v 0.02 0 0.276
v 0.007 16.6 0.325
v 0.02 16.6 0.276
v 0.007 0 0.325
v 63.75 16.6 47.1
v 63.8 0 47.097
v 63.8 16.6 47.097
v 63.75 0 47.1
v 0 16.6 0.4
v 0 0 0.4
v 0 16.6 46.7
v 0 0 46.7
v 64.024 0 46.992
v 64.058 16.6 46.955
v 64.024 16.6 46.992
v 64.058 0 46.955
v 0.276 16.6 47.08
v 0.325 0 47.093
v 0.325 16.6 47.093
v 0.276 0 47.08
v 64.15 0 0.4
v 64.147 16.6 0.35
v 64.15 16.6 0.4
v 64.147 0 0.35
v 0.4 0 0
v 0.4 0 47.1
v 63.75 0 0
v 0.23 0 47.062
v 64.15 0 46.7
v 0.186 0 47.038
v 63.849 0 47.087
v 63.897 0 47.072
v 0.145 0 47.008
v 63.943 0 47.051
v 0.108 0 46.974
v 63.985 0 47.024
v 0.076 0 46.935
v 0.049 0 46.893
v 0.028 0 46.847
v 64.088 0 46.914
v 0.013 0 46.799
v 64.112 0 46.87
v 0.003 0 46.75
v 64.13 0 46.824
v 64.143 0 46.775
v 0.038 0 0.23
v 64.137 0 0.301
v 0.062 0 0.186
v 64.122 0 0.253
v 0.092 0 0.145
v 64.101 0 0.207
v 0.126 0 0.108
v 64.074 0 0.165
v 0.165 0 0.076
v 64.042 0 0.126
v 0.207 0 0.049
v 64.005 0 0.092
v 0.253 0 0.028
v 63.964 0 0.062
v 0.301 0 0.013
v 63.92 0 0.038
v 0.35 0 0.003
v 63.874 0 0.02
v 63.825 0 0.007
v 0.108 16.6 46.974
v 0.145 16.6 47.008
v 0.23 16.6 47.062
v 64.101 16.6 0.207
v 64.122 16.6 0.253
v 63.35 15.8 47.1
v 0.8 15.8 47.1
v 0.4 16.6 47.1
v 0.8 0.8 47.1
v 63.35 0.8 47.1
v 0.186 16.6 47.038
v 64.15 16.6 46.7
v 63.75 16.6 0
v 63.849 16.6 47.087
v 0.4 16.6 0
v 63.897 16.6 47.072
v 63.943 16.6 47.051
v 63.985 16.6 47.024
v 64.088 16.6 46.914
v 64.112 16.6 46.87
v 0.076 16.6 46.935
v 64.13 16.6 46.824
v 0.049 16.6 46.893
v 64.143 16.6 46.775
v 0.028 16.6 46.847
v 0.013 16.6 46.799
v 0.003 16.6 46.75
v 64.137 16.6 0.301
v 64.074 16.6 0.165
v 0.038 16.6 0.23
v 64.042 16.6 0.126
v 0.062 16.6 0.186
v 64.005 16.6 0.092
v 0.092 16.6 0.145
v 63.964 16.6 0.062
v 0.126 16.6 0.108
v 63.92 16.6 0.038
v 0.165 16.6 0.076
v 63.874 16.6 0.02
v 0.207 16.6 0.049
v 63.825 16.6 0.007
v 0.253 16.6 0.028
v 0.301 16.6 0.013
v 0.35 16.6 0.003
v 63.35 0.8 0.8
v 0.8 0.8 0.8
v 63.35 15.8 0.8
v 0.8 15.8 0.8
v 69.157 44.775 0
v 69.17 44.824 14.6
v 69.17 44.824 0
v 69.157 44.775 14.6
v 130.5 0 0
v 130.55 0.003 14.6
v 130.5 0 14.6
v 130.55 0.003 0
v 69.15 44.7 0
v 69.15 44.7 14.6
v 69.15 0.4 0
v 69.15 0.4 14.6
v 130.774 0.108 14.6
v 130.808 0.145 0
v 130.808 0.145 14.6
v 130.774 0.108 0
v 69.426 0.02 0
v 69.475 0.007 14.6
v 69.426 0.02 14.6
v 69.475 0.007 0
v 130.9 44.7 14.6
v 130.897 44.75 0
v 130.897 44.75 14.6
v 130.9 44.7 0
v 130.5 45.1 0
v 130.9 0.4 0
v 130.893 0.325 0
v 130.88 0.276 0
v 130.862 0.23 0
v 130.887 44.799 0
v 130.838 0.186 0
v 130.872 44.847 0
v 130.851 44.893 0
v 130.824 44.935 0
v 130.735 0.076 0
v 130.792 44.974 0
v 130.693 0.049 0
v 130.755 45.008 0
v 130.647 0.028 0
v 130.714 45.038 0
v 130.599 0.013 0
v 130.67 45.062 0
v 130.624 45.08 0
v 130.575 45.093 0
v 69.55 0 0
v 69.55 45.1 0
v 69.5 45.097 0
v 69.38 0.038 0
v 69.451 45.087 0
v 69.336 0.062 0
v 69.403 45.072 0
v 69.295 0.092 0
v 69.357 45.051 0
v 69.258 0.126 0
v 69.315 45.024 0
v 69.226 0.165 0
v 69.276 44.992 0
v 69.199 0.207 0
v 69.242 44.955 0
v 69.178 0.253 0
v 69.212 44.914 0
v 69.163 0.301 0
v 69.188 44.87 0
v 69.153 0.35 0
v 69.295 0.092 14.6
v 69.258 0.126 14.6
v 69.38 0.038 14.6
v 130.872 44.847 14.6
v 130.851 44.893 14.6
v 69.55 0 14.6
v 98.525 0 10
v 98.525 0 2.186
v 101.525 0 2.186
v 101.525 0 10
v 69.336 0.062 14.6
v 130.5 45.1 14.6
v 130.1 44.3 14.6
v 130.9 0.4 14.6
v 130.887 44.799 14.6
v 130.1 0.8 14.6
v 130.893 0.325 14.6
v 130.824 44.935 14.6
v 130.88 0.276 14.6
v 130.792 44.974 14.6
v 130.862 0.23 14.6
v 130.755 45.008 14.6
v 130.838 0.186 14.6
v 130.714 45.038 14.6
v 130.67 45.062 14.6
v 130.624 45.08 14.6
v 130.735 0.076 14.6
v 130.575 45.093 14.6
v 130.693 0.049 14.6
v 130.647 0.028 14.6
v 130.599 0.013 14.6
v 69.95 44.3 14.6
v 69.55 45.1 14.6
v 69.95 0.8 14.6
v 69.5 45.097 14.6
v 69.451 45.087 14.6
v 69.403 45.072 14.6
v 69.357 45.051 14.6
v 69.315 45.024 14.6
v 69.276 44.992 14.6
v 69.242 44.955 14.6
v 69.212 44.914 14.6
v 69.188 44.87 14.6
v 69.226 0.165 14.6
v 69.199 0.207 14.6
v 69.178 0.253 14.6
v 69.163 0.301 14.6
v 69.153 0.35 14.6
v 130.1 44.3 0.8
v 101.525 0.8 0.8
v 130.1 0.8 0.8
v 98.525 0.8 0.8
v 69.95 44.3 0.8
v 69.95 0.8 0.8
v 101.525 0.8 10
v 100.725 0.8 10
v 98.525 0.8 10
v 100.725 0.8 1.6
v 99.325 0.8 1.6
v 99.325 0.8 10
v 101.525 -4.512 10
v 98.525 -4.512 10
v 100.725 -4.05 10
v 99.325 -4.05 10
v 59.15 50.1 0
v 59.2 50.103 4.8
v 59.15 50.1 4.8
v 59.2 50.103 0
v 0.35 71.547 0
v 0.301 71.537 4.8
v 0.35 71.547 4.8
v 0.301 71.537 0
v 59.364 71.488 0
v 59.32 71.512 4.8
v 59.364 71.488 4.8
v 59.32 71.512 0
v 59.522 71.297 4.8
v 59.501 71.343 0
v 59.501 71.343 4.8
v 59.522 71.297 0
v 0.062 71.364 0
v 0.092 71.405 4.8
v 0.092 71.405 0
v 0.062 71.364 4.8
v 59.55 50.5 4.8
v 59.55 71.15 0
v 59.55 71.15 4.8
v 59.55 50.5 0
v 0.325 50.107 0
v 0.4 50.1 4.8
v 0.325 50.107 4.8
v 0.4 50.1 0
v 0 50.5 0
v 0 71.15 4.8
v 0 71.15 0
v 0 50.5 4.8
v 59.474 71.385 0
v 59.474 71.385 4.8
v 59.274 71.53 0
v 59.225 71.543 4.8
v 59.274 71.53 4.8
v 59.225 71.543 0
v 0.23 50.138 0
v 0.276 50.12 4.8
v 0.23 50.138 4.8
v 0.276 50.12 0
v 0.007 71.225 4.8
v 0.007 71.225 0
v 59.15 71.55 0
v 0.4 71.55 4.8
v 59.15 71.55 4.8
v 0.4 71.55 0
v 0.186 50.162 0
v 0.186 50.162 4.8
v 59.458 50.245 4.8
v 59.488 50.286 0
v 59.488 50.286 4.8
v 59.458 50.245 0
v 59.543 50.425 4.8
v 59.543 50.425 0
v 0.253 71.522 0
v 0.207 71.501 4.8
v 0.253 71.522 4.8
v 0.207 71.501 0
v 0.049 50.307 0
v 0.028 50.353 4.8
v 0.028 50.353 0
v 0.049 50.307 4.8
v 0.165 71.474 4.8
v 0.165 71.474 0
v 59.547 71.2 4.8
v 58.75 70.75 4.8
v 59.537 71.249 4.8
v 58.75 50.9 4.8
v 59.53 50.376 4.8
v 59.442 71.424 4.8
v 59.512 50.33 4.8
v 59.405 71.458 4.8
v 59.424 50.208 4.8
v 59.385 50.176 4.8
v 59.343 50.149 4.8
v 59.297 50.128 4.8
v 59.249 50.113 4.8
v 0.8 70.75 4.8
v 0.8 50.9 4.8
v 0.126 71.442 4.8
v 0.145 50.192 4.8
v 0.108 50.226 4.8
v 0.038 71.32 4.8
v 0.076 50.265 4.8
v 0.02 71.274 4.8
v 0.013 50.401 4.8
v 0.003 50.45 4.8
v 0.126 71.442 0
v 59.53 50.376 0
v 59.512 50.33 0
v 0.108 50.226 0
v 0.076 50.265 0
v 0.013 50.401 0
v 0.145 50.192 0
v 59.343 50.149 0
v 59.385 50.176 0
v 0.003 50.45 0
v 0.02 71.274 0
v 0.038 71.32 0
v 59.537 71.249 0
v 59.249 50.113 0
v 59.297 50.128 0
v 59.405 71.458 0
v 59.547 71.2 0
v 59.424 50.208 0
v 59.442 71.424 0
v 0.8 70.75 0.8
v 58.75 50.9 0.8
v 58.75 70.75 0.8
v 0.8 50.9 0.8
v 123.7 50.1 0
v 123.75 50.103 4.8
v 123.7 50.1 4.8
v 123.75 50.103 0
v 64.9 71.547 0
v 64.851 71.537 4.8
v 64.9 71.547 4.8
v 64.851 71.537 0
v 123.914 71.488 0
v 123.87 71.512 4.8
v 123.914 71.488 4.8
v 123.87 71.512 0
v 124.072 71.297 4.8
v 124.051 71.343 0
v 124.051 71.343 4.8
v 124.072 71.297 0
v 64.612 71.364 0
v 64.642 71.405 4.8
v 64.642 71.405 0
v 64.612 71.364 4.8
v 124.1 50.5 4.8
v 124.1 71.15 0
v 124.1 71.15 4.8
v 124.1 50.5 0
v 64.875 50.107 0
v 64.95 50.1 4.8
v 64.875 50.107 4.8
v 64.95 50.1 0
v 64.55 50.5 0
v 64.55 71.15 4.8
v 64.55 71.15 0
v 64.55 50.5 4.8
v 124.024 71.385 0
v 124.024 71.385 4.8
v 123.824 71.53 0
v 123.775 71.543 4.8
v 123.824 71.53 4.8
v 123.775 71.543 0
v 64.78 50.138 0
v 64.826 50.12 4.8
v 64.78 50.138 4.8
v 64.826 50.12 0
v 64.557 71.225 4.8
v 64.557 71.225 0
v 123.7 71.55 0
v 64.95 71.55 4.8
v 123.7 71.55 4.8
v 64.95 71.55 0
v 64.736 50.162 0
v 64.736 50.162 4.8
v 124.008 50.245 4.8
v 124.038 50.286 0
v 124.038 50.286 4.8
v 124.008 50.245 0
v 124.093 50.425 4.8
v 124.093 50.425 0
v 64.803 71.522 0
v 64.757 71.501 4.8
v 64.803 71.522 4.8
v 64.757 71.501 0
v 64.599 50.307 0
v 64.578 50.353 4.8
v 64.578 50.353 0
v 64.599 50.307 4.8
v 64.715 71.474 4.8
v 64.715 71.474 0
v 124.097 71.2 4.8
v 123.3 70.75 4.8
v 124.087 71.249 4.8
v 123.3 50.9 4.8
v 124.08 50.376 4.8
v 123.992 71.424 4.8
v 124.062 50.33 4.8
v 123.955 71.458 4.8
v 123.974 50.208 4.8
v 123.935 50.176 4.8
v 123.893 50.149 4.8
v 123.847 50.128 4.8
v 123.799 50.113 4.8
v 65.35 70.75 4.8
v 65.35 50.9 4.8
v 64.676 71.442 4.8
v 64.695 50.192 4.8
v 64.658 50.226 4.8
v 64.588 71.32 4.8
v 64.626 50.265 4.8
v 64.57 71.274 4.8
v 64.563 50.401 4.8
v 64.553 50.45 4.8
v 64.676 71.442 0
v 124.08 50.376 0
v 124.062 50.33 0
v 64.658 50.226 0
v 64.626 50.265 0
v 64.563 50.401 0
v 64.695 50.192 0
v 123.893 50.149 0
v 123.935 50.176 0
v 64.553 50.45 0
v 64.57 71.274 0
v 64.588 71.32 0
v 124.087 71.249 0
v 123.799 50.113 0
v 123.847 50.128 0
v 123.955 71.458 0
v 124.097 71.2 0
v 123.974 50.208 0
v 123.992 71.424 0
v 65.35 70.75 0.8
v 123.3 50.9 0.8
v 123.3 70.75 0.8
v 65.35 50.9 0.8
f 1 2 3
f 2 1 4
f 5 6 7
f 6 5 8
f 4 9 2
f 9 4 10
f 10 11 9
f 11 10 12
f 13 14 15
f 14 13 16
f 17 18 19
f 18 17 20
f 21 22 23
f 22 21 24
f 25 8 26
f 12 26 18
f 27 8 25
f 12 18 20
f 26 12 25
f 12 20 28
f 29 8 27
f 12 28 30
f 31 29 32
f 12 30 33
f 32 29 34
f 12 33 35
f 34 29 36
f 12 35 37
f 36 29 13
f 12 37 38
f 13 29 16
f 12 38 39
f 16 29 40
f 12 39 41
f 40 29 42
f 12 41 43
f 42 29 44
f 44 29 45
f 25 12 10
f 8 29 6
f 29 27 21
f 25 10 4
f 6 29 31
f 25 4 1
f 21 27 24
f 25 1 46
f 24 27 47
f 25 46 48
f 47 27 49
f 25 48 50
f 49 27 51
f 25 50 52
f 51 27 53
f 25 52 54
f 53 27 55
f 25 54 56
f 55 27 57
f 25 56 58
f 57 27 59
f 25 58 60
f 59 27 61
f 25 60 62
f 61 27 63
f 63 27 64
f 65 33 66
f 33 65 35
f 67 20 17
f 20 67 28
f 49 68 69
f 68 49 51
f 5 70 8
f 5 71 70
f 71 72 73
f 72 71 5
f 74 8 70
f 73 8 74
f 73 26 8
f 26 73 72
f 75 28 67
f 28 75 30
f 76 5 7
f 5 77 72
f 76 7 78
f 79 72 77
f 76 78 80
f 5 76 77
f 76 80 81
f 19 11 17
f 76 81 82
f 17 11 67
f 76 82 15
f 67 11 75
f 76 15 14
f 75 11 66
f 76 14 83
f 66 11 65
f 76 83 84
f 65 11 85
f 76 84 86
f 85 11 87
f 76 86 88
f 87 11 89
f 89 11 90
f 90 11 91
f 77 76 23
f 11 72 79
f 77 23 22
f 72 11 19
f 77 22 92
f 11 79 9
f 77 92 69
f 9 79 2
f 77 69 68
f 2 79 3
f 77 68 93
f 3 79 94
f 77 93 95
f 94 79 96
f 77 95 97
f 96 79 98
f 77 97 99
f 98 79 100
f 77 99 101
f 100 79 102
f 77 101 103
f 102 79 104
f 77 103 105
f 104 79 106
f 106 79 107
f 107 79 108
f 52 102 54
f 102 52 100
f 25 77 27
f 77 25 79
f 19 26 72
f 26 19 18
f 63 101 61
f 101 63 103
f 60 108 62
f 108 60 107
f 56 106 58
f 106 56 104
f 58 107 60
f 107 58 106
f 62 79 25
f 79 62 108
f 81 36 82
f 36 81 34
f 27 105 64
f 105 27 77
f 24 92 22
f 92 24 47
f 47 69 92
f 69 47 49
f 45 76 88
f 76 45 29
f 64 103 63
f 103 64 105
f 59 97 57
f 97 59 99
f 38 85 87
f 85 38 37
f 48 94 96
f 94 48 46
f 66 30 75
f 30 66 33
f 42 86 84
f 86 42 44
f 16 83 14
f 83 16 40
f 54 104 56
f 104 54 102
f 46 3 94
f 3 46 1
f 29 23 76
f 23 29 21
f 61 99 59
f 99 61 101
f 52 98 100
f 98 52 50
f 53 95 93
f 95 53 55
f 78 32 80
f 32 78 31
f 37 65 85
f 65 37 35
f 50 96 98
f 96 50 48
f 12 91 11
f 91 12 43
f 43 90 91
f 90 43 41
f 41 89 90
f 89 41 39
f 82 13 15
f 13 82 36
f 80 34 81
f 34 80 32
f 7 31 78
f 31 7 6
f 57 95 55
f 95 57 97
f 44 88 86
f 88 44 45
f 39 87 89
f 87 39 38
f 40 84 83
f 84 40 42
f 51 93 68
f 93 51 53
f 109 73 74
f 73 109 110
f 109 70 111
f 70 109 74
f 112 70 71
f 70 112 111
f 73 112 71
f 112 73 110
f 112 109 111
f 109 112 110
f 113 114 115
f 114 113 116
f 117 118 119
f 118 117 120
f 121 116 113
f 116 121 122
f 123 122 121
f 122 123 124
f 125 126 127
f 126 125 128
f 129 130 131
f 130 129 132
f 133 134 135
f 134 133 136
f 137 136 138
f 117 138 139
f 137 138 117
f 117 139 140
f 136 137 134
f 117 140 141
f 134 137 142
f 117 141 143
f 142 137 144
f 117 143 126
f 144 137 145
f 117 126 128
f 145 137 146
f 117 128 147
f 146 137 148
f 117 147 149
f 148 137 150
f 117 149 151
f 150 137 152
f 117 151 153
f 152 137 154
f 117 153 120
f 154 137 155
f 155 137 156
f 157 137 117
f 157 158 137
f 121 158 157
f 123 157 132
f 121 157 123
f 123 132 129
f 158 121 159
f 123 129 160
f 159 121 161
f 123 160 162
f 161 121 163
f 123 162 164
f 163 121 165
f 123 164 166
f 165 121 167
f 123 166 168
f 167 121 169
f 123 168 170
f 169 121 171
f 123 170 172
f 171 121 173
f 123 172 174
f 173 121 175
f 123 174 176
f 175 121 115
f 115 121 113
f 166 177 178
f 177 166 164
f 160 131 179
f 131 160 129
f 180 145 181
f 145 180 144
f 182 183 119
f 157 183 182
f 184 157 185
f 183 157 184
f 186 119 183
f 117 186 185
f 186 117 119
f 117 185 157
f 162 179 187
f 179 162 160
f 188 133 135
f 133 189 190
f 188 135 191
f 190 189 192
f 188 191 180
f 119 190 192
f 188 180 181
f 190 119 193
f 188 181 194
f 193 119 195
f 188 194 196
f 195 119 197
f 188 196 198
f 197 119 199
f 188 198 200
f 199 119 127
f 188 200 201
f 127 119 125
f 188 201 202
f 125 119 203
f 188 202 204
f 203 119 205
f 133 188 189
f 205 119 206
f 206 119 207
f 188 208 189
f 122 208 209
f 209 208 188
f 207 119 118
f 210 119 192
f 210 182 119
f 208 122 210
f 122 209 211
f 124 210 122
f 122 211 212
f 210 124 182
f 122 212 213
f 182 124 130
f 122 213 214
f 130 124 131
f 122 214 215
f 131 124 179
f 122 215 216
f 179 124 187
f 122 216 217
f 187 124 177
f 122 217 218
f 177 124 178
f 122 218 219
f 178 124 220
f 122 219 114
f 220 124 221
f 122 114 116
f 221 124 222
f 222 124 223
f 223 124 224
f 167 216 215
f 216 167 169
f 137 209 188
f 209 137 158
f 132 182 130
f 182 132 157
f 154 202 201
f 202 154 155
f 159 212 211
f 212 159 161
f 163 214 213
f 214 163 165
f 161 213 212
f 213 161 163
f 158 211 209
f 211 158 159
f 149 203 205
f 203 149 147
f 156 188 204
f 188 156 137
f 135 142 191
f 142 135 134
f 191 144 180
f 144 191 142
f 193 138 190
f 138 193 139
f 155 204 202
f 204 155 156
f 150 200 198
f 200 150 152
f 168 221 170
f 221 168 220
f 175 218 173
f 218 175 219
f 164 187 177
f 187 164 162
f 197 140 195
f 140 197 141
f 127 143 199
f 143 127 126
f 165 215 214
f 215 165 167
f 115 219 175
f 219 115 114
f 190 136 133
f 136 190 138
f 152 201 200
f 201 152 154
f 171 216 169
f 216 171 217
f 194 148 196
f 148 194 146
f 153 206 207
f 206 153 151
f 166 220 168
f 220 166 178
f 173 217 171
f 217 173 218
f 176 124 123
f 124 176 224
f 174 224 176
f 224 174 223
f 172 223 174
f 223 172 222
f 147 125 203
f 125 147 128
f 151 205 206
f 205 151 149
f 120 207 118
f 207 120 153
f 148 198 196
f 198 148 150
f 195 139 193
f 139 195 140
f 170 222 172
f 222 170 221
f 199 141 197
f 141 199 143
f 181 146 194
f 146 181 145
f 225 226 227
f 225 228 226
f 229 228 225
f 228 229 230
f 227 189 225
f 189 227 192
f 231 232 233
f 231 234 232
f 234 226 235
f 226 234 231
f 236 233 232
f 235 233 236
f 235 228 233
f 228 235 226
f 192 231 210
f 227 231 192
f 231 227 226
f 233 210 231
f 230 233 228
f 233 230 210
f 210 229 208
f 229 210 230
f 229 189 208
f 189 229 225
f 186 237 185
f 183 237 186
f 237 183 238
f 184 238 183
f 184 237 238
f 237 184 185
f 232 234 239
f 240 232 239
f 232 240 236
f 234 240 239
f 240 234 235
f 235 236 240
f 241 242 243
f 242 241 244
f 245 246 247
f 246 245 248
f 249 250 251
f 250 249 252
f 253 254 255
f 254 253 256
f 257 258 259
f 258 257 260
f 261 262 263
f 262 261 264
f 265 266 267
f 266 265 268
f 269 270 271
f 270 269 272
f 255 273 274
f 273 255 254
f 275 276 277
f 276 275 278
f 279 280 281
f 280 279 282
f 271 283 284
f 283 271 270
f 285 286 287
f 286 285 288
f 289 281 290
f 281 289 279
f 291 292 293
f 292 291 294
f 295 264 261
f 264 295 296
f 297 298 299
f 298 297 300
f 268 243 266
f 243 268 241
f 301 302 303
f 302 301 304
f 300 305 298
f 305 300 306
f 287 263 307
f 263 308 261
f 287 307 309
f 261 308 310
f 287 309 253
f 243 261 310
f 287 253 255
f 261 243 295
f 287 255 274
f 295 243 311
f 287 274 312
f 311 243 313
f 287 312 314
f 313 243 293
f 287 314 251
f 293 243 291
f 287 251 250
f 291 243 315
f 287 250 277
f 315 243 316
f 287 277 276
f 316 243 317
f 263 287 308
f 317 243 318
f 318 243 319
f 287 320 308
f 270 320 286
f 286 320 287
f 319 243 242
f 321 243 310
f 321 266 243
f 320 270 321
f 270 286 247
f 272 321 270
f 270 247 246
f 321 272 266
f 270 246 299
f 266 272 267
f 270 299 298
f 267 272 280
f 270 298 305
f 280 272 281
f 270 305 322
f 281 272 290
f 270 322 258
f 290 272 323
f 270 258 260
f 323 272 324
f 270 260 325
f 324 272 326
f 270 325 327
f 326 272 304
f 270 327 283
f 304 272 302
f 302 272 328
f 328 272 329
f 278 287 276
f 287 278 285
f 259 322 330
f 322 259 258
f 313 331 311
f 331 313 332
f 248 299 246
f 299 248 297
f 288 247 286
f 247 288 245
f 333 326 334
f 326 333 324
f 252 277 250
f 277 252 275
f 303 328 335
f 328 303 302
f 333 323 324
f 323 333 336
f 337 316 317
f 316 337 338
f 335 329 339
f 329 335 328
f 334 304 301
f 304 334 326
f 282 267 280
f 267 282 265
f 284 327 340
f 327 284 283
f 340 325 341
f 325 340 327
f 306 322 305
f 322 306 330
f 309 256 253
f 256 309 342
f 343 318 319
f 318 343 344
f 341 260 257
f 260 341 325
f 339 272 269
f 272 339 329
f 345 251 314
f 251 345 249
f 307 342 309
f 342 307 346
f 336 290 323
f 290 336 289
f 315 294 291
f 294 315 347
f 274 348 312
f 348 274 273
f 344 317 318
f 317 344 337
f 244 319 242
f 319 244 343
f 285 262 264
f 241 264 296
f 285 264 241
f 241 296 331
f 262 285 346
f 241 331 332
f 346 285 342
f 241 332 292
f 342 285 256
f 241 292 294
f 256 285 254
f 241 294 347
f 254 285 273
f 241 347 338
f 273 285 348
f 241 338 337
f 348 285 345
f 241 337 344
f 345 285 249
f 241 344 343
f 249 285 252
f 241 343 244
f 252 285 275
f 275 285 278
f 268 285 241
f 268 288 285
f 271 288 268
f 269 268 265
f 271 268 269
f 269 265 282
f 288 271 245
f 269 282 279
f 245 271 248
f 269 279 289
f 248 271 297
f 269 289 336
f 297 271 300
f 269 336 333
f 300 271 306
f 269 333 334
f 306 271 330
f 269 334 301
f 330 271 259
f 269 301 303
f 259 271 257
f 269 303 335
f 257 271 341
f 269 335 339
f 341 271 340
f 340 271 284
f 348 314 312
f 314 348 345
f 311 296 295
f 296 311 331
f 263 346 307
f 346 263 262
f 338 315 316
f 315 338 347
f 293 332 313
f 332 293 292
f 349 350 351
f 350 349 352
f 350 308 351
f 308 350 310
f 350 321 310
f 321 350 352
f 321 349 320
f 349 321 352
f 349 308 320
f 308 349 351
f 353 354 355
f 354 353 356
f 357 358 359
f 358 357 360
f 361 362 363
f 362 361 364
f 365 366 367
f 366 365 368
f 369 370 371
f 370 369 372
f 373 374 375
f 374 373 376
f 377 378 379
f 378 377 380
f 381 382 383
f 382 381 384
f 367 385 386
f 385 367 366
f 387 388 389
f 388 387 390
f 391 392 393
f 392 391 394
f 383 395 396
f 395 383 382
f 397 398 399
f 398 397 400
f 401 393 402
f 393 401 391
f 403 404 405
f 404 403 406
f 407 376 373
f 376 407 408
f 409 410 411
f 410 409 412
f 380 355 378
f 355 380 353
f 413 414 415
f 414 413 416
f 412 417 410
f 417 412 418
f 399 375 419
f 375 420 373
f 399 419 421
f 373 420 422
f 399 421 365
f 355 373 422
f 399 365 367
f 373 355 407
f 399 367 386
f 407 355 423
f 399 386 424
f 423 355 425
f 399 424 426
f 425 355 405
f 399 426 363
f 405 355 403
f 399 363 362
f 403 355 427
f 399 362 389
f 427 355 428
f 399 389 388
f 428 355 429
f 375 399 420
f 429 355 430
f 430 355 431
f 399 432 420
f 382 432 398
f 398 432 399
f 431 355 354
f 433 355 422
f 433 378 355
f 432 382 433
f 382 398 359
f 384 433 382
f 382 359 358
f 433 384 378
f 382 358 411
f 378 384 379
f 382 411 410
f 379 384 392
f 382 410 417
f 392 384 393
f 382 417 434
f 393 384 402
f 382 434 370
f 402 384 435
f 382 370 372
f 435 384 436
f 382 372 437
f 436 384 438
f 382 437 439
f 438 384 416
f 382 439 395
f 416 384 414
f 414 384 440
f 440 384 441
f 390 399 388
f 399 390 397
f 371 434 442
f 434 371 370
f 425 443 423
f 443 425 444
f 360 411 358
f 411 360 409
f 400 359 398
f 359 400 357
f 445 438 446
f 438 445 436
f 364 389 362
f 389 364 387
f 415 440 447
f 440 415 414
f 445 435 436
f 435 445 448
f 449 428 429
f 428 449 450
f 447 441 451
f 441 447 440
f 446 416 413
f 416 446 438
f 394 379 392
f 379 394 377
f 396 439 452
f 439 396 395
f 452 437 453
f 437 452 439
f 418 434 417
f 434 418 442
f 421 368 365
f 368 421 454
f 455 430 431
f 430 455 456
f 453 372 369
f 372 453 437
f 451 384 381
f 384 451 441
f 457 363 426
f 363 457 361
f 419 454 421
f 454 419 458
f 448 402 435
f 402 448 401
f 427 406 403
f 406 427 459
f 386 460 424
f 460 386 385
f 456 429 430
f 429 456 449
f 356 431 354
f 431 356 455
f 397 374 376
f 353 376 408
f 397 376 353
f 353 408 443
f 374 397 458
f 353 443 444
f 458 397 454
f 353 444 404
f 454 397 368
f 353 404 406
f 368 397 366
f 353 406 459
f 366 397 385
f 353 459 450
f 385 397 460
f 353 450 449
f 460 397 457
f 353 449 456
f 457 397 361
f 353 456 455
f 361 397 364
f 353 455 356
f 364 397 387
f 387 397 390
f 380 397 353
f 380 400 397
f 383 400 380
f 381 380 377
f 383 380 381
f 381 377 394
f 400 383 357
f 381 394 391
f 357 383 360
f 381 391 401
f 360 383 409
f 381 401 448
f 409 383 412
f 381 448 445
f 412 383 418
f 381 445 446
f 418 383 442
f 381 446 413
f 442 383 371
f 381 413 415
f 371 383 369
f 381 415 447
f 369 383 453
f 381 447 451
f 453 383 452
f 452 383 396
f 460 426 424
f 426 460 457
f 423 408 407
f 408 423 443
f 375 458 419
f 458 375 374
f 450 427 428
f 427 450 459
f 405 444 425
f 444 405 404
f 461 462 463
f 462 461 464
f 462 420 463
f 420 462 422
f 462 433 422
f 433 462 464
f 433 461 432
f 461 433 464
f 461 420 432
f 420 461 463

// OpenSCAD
/* [Print Layout] */

// Preview the parts in the optimal orientation for 3D printing.
print_orientation = true; // [true, false]
// Additional spacing between key trays in print orientation to prevent brim collision.
print_tray_spacing_mm = 5; // [0:1:50]

// printer bed dimensions
printer = "p1s"; // [p1s, ender3v2]
bed_x_mm = printer == "p1s" ? 250 : 220;
bed_y_mm = printer == "p1s" ? 250 : 220;

/* [Key Profile] */

// Select the key spacing standard used to size each tray footprint.
key_profile = "mx"; // [mx, choc]

/* [3D Printing] */

// 3D printing settings and validation.
spiral_vase = false; // [true, false]
nozzle_width_mm = 0.4; // [0.2:0.05:1.0]

// Shared wall and floor dimensions.
wall_lines = 2; // [1:1:5]
floor_layers = 2; // [1:1:5]

// Effective print dimensions. Spiral vase mode forces single-line walls and floor.
effective_wall_thickness_mm = spiral_vase ? nozzle_width_mm : wall_lines * nozzle_width_mm;
effective_floor_thickness_mm = spiral_vase ? nozzle_width_mm : floor_layers * nozzle_width_mm;

assert(nozzle_width_mm > 0, "nozzle_width_mm must be greater than 0");
assert(wall_lines > 0, "wall_lines must be greater than 0");
assert(floor_layers > 0, "floor_layers must be greater than 0");
assert(default_clearance_mm >= 0, "default_clearance_mm must be non-negative");
assert(
  !spiral_vase || wall_lines == 1,
  "spiral_vase requires wall_lines to be exactly 1"
);
assert(
  !spiral_vase || floor_layers == 1,
  "spiral_vase requires floor_layers to be exactly 1"
);

/* [Clearance] */

// General fit clearance applied to most nested parts.
default_clearance_mm = 0.4; // [0:0.05:1.0]
// Fit clearance around the tray container inside the drawer.
drawer_clearance_mm = 0.4; // [0:0.05:1.0]
// Fit clearance around individual trays inside the container.
tray_container_clearance_mm = 0.3; // [0:0.05:1.0]

/* [Key Trays] */

// Layout sizing: trays span the full row width/depth, with one tray per row.
tray_orientation = "width"; // [width, length]
tray_count = [3, 2]; // [1:1:12]

// Tray-specific sizing controls.
keycap_height_preset = "OEM"; // [Custom, SA, OEM, Cherry, XDA, DSA, G20]
custom_max_keycap_height_mm = 17; // [6:0.1:20]
max_keycap_height_mm =
  keycap_height_preset == "SA" ? 16.5
  : keycap_height_preset == "OEM" ? 11.9
  : keycap_height_preset == "Cherry" ? 9.4
  : keycap_height_preset == "XDA" ? 9.1
  : keycap_height_preset == "DSA" ? 7.6
  : keycap_height_preset == "G20" ? 7.6
  : custom_max_keycap_height_mm;
tray_lip_height_mm = 4; // [1:0.5:20]
tray_length_u = 1; // [1:1:8]

/* [Tray Container Handle] */

// Dimensions and angle of the handle slope on the tray container.
handle_height_mm = 10; // [0:0.5:20]
handle_width_mm = 3; // [0:0.5:20]
// Angle of the handle slope relative to plate, can easily break handle if too steep.
handle_angle_deg = 60; // [30:5:80]

/* [Advanced Geometry] */

// Tiny vertical corner rounding to smooth toolpaths without materially changing fit.
vertical_corner_radius_mm = 0.4; // [0:0.05:1.0]

/* [Key Tray Spacing] */

// Standard key spacing dimensions.
mx_key_spacing_mm = 19.05; // [18:0.05:20]
choc_key_spacing_x_mm = 18; // [16:0.05:20]
choc_key_spacing_y_mm = 17; // [16:0.05:20]

/* [Hidden] */

// Spread the drawer, container, and trays apart for inspection.
debug_exploded_view = false; // [true, false]
debug_explode_distance_mm = print_tray_spacing_mm; // [0:1:100]

fancy_render = true;
$fn = fancy_render ? 50 : 10;

// Resolve the active spacing from the selected key profile.
key_spacing_x_mm = key_profile == "mx" ? mx_key_spacing_mm : choc_key_spacing_x_mm;
key_spacing_y_mm = key_profile == "mx" ? mx_key_spacing_mm : choc_key_spacing_y_mm;

// A tray is fixed to 1u in y, while row width in x and lip height in z remain parametric.
row_tray_width_u = tray_orientation == "width" ? tray_count[0] : tray_length_u;
row_tray_length_u = tray_orientation == "width" ? tray_length_u : tray_count[1];
tray_height_mm = tray_lip_height_mm;
stack_height_mm = max_keycap_height_mm + default_clearance_mm * 2;

// Inner tray envelope sized around one row-wide tray footprint plus fit clearance.
tray_inner_x_mm = key_spacing_x_mm * row_tray_width_u + default_clearance_mm * 2;
tray_inner_y_mm = key_spacing_y_mm * row_tray_length_u + default_clearance_mm * 2;
tray_inner_z_mm = tray_height_mm;

// Outer tray shell dimensions.
tray_outer_x_mm = tray_inner_x_mm + effective_wall_thickness_mm * 2;
tray_outer_y_mm = tray_inner_y_mm + effective_wall_thickness_mm * 2;
tray_outer_z_mm = tray_inner_z_mm + effective_floor_thickness_mm;
tray_outer_corner_radius_mm = min(vertical_corner_radius_mm, min(tray_outer_x_mm, tray_outer_y_mm) / 2);
tray_inner_corner_radius_mm = max(0, tray_outer_corner_radius_mm - effective_wall_thickness_mm);

// Container inner cavity sized to receive one tray per row and the full key stack height.
tray_container_inner_x_mm =
  tray_orientation == "width" ?
    tray_outer_x_mm + tray_container_clearance_mm * 2
  : tray_outer_x_mm * tray_count[0] + tray_container_clearance_mm * 2;
tray_container_inner_y_mm =
  tray_orientation == "width" ?
    tray_outer_y_mm * tray_count[1] + tray_container_clearance_mm * 2
  : tray_outer_y_mm + tray_container_clearance_mm * 2;
tray_container_inner_z_mm = stack_height_mm + effective_floor_thickness_mm + tray_container_clearance_mm;

// Outer container shell dimensions.
tray_container_outer_x_mm = tray_container_inner_x_mm + effective_wall_thickness_mm * 2;
tray_container_outer_y_mm = tray_container_inner_y_mm + effective_wall_thickness_mm * 2;
tray_container_outer_z_mm = tray_container_inner_z_mm + effective_floor_thickness_mm;
tray_container_outer_corner_radius_mm = min(vertical_corner_radius_mm, min(tray_container_outer_x_mm, tray_container_outer_y_mm) / 2);
tray_container_inner_corner_radius_mm = max(0, tray_container_outer_corner_radius_mm - effective_wall_thickness_mm);
handle_rise_mm = min(10, tray_container_outer_z_mm);
handle_run_mm = handle_rise_mm / tan(handle_angle_deg);
handle_projection_mm = max(handle_height_mm, handle_run_mm);
handle_corner_radius_mm = min(2, handle_rise_mm / 2, handle_projection_mm / 2);
handle_fillet_adjacent_mm = handle_corner_radius_mm / tan(handle_angle_deg);
handle_hypotenuse_mm = handle_rise_mm / sin(handle_angle_deg);

// Drawer inner cavity sized to receive the tray container from the front.
drawer_inner_x_mm = tray_container_outer_x_mm + drawer_clearance_mm * 2;
drawer_inner_y_mm = tray_container_outer_y_mm + drawer_clearance_mm + effective_wall_thickness_mm;
drawer_inner_z_mm = tray_container_outer_z_mm + drawer_clearance_mm;

// Outer drawer shell dimensions.
drawer_outer_x_mm = drawer_inner_x_mm + effective_wall_thickness_mm * 2;
drawer_outer_y_mm = drawer_inner_y_mm + effective_wall_thickness_mm;
drawer_outer_z_mm = drawer_inner_z_mm + effective_floor_thickness_mm + effective_wall_thickness_mm;
drawer_outer_corner_radius_mm = min(vertical_corner_radius_mm, min(drawer_outer_x_mm, drawer_outer_y_mm) / 2);
drawer_inner_corner_radius_mm = max(0, drawer_outer_corner_radius_mm - effective_wall_thickness_mm);

// Build a rounded rectangular prism with tiny fillets on the vertical corners.
module rounded_rect_prism(size, radius) {
  linear_extrude(height=size[2])
    offset(r=radius)
      translate([radius, radius])
        square(
          [
            max(0.01, size[0] - radius * 2),
            max(0.01, size[1] - radius * 2),
          ]
        );
}

module tray_container_handle_body(
  handle_width_mm = handle_width_mm,
  effective_floor_thickness_mm = effective_floor_thickness_mm,
  thickness_offset_mm = 0,
  y_extension_mm = 0
) {
  // We want to pull the front face inward by thickness_offset_mm to leave wall thickness.
  local_rise = max(0.01, handle_rise_mm - effective_floor_thickness_mm);
  local_run = local_rise / tan(handle_angle_deg);
  // Ensure local_projection is at least local_run to prevent self-intersecting polygon
  local_projection = max(local_run, handle_projection_mm / 2 - thickness_offset_mm);

  // Rotate[90, 180, 270] mapping logic:
  // 1. Z-axis extrusion maps to World X (left-to-right). This means the handle spans
  //    across the tray from `(tray_container_outer_x_mm + handle_width_mm) / 2` 
  //    towards the left by `handle_width_mm`.
  // 2. Local X-axis maps to World -Y (outward projection). Negative local X values 
  //    project forward away from the tray.
  // 3. Local Y-axis maps to World -Z (downward depth). Negative local Y values
  //    extend upwards from the floor.
  // The translation ensures the base of the sloped face aligns perfectly with the tray wall.
  translate(
    [
      (tray_container_outer_x_mm + handle_width_mm) / 2,
      local_projection - local_run + effective_wall_thickness_mm, // align bottom of slope with tray face
      effective_floor_thickness_mm, // Bottom at floor level
    ]
  )
    rotate([90, 180, 270])
      linear_extrude(height=handle_width_mm)
        polygon(
          points=[
            [y_extension_mm, 0], // Back Bottom (at floor level)
            [-local_projection + local_run, 0], // Front Bottom
            [-local_projection, -local_rise], // Front Top (max height)
            [y_extension_mm, -local_rise], // Back Top
          ]
        );
}

module tray_container_handle_side_fillet_cutter(
  side,
  handle_corner_radius_mm = handle_corner_radius_mm,
  handle_width_mm = handle_width_mm,
  effective_floor_thickness_mm = effective_floor_thickness_mm
) {
  if (side < 0) {
    difference() {
      translate(
        [
          (tray_container_outer_x_mm - handle_width_mm) / 2 - handle_corner_radius_mm,
          -handle_corner_radius_mm,
          effective_floor_thickness_mm,
        ]
      )
        cube(
          [
            handle_corner_radius_mm,
            handle_corner_radius_mm,
            handle_rise_mm,
          ]
        );
      translate(
        [
          (tray_container_outer_x_mm - handle_width_mm) / 2 - handle_corner_radius_mm,
          -handle_corner_radius_mm,
          effective_floor_thickness_mm,
        ]
      )
        cylinder(h=handle_rise_mm, r=handle_corner_radius_mm);
    }
  } else {
    translate(
      [
        (tray_container_outer_x_mm + handle_width_mm) / 2 + handle_corner_radius_mm,
        -handle_corner_radius_mm,
        effective_floor_thickness_mm,
      ]
    )
      rotate([0, 0, 270])
        translate(
          [
            -(tray_container_outer_x_mm + handle_width_mm) / 2,
            handle_corner_radius_mm,
            -effective_floor_thickness_mm,
          ]
        )
          difference() {
            translate(
              [
                (tray_container_outer_x_mm + handle_width_mm) / 2,
                -handle_corner_radius_mm,
                effective_floor_thickness_mm,
              ]
            )
              cube(
                [
                  handle_corner_radius_mm,
                  handle_corner_radius_mm,
                  handle_rise_mm,
                ]
              );
            translate(
              [
                (tray_container_outer_x_mm + handle_width_mm) / 2,
                -handle_corner_radius_mm,
                effective_floor_thickness_mm,
              ]
            )
              cylinder(h=handle_rise_mm, r=handle_corner_radius_mm);
          }
  }
}

module tray_container_handle_hypotenuse_fillet_cutter(
  side,
  handle_corner_radius_mm = handle_corner_radius_mm,
  handle_width_mm = handle_width_mm,
  effective_floor_thickness_mm = effective_floor_thickness_mm,
  handle_hypotenuse_mm = handle_hypotenuse_mm
) {
  angle = 90 - handle_angle_deg;
  if (side < 0) {
    translate(
      [
        (tray_container_outer_x_mm - handle_width_mm) / 2 - handle_corner_radius_mm,
        -handle_corner_radius_mm * 2 * tan(angle),
        effective_floor_thickness_mm,
      ]
    )
      rotate([-angle, 0, 180])
        translate(
          [
            -( (tray_container_outer_x_mm - handle_width_mm) / 2 + handle_corner_radius_mm),
            -handle_corner_radius_mm,
            -effective_floor_thickness_mm - (handle_corner_radius_mm * tan(angle)),
          ]
        )
          difference() {
            translate(
              [
                (tray_container_outer_x_mm - handle_width_mm) / 2 - handle_corner_radius_mm,
                -handle_corner_radius_mm,
                effective_floor_thickness_mm,
              ]
            )
              cube(
                [
                  handle_corner_radius_mm,
                  handle_corner_radius_mm,
                  handle_hypotenuse_mm,
                ]
              );
            translate(
              [
                (tray_container_outer_x_mm - handle_width_mm) / 2 - handle_corner_radius_mm,
                -handle_corner_radius_mm,
                effective_floor_thickness_mm,
              ]
            )
              cylinder(h=handle_hypotenuse_mm, r=handle_corner_radius_mm);
          }
  } else {
    translate([tray_container_outer_x_mm, 0, 0])
      mirror([1, 0, 0])
        tray_container_handle_hypotenuse_fillet_cutter(
          -1,
          handle_corner_radius_mm=handle_corner_radius_mm,
          handle_width_mm=handle_width_mm,
          effective_floor_thickness_mm=effective_floor_thickness_mm,
          handle_hypotenuse_mm=handle_hypotenuse_mm
        );
  }
}

// Build the front tray-container handle as an angled prism rising from the base.
module tray_container_handle(
  handle_corner_radius_mm = handle_corner_radius_mm,
  handle_width_mm = handle_width_mm,
  effective_floor_thickness_mm = effective_floor_thickness_mm,
  handle_hypotenuse_mm = handle_hypotenuse_mm,
  thickness_offset_mm = 0,
  y_extension_mm = 0
) {
  // TODO: add fillets to the handle
  difference() {
    union() {
      tray_container_handle_body(
        handle_width_mm=handle_width_mm,
        effective_floor_thickness_mm=effective_floor_thickness_mm,
        thickness_offset_mm=thickness_offset_mm,
        y_extension_mm=y_extension_mm
      );
      // tray_container_handle_side_fillet_cutter(
      //   -1,
      //   handle_corner_radius_mm=handle_corner_radius_mm,
      //   handle_width_mm=handle_width_mm,
      //   effective_floor_thickness_mm=effective_floor_thickness_mm
      // );
      // tray_container_handle_side_fillet_cutter(
      //   1,
      //   handle_corner_radius_mm=handle_corner_radius_mm,
      //   handle_width_mm=handle_width_mm,
      //   effective_floor_thickness_mm=effective_floor_thickness_mm
      // );
    }
    ;
    // tray_container_handle_hypotenuse_fillet_cutter(
    //   -1,
    //   handle_corner_radius_mm=handle_corner_radius_mm,
    //   handle_width_mm=handle_width_mm,
    //   effective_floor_thickness_mm=effective_floor_thickness_mm,
    //   handle_hypotenuse_mm=handle_hypotenuse_mm
    // );
    // tray_container_handle_hypotenuse_fillet_cutter(
    //   1,
    //   handle_corner_radius_mm=handle_corner_radius_mm,
    //   handle_width_mm=handle_width_mm,
    //   effective_floor_thickness_mm=effective_floor_thickness_mm,
    //   handle_hypotenuse_mm=handle_hypotenuse_mm
    // );
  }
}

// Take the handle and subtract a smaller handle
module tray_container_handle_with_cutout(
  handle_corner_radius_mm = handle_corner_radius_mm,
  handle_width_mm = handle_width_mm,
  effective_floor_thickness_mm = effective_floor_thickness_mm,
  handle_hypotenuse_mm = handle_hypotenuse_mm
) {
  difference() {
    tray_container_handle(
      handle_corner_radius_mm=handle_corner_radius_mm,
      handle_width_mm=handle_width_mm,
      effective_floor_thickness_mm=effective_floor_thickness_mm,
      handle_hypotenuse_mm=handle_hypotenuse_mm
    );
    tray_container_handle(
      handle_corner_radius_mm=handle_corner_radius_mm - effective_wall_thickness_mm,
      handle_width_mm=handle_width_mm - effective_wall_thickness_mm * 2,
      effective_floor_thickness_mm=effective_floor_thickness_mm + effective_wall_thickness_mm,
      handle_hypotenuse_mm=handle_hypotenuse_mm
    );
  }
}

// Build a single open-top tray.
module key_tray() {
  difference() {
    rounded_rect_prism(
      [tray_outer_x_mm, tray_outer_y_mm, tray_outer_z_mm],
      tray_outer_corner_radius_mm
    );
    translate([effective_wall_thickness_mm, effective_wall_thickness_mm, effective_floor_thickness_mm])
      rounded_rect_prism(
        [tray_inner_x_mm, tray_inner_y_mm, tray_inner_z_mm],
        tray_inner_corner_radius_mm
      );
  }
}

// Build the open-top container shell that holds one or more trays.
module tray_container() {
  difference() {
    union() {
      difference() {
        rounded_rect_prism(
          [tray_container_outer_x_mm, tray_container_outer_y_mm, tray_container_outer_z_mm],
          tray_container_outer_corner_radius_mm
        );
        translate([effective_wall_thickness_mm, effective_wall_thickness_mm, effective_floor_thickness_mm])
          rounded_rect_prism(
            [tray_container_inner_x_mm, tray_container_inner_y_mm, tray_container_inner_z_mm],
            tray_container_inner_corner_radius_mm
          );
      }
      ;
      // TODO: add fillets to the handle
      tray_container_handle(
        handle_corner_radius_mm=handle_corner_radius_mm,
        handle_width_mm=handle_width_mm,
        effective_floor_thickness_mm=effective_floor_thickness_mm,
        handle_hypotenuse_mm=handle_hypotenuse_mm
      );
    }

    tray_container_handle(
      handle_corner_radius_mm=handle_corner_radius_mm - effective_wall_thickness_mm,
      handle_width_mm=handle_width_mm - effective_wall_thickness_mm * 2,
      effective_floor_thickness_mm=effective_floor_thickness_mm + effective_wall_thickness_mm,
      handle_hypotenuse_mm=handle_hypotenuse_mm,
      thickness_offset_mm=effective_wall_thickness_mm,
      y_extension_mm=effective_wall_thickness_mm * 2
    );
  }
}

// Build the outer drawer shell with a front opening for the tray container.
module outer_drawer() {
  difference() {
    rounded_rect_prism(
      [drawer_outer_x_mm, drawer_outer_y_mm, drawer_outer_z_mm],
      drawer_outer_corner_radius_mm
    );
    translate([effective_wall_thickness_mm, 0, effective_floor_thickness_mm])
      rounded_rect_prism(
        [drawer_inner_x_mm, drawer_inner_y_mm, drawer_inner_z_mm],
        drawer_inner_corner_radius_mm
      );
  }
}

// Place one tray in each row so the tray width follows the container width.
module tray_container_layout() {
  if (tray_orientation == "width") {
    for (iy = [0:tray_count[1] - 1]) {
      translate(
        [
          effective_wall_thickness_mm + tray_container_clearance_mm,
          effective_wall_thickness_mm + tray_container_clearance_mm + iy * tray_outer_y_mm,
          effective_floor_thickness_mm,
        ]
      )
        key_tray();
    }
  } else {
    for (ix = [0:tray_count[0] - 1]) {
      translate(
        [
          effective_wall_thickness_mm + tray_container_clearance_mm + ix * tray_outer_x_mm,
          effective_wall_thickness_mm + tray_container_clearance_mm,
          effective_floor_thickness_mm,
        ]
      )
        key_tray();
    }
  }
}

// Preview the fitted relationship between the tray container and its trays.
module tray_container_assembly() {
  tray_container();
  tray_container_layout();
}

// Preview the drawer, container, and trays separated for easier inspection.
module exploded_drawer_assembly() {
  outer_drawer();
  translate(
    [
      drawer_outer_x_mm + debug_explode_distance_mm,
      0,
      0,
    ]
  )
    tray_container();
  translate(
    [
      drawer_outer_x_mm + tray_container_outer_x_mm + debug_explode_distance_mm * 2,
      0,
      0,
    ]
  )
    tray_container_layout();
}

// Preview the fitted relationship between the drawer, container, and trays.
module drawer_assembly() {
  outer_drawer();
  translate(
    [
      effective_wall_thickness_mm + drawer_clearance_mm,
      0,
      effective_floor_thickness_mm,
    ]
  )
    tray_container_assembly();
}

module print_drawer_assembly() {
  num_trays = tray_orientation == "width" ? tray_count[1] : tray_count[0];

  // 1. Drawer goes first, bottom-left
  // It is rotated so it stands on its back.
  drawer_print_x = drawer_outer_x_mm;
  drawer_print_y = drawer_outer_z_mm; // Z becomes Y after rotation

  translate([0, 0, drawer_outer_y_mm])
    rotate([-90, 0, 0])
      outer_drawer();

  // 2. Container
  // If it fits next to the drawer, put it there, otherwise stack above
  container_fits_x = (drawer_print_x + print_tray_spacing_mm + tray_container_outer_x_mm) <= bed_x_mm;
  container_x = container_fits_x ? drawer_print_x + print_tray_spacing_mm : 0;
  container_y = container_fits_x ? 0 : drawer_print_y + print_tray_spacing_mm;

  translate([container_x, container_y, 0])
    tray_container();

  // 3. Trays (arranged in a grid)
  trays_start_y = max(
    drawer_print_y,
    container_y + tray_container_outer_y_mm
  ) + print_tray_spacing_mm;

  trays_per_row = max(1, floor((bed_x_mm + print_tray_spacing_mm) / (tray_outer_x_mm + print_tray_spacing_mm)));

  for (i = [0:num_trays - 1]) {
    col = i % trays_per_row;
    row = floor(i / trays_per_row);
    translate(
      [
        col * (tray_outer_x_mm + print_tray_spacing_mm),
        trays_start_y + row * (tray_outer_y_mm + print_tray_spacing_mm),
        0,
      ]
    )
      key_tray();
  }
}

if (print_orientation) {
  print_drawer_assembly();
} else if (debug_exploded_view) {
  exploded_drawer_assembly();
} else {
  drawer_assembly();
}
